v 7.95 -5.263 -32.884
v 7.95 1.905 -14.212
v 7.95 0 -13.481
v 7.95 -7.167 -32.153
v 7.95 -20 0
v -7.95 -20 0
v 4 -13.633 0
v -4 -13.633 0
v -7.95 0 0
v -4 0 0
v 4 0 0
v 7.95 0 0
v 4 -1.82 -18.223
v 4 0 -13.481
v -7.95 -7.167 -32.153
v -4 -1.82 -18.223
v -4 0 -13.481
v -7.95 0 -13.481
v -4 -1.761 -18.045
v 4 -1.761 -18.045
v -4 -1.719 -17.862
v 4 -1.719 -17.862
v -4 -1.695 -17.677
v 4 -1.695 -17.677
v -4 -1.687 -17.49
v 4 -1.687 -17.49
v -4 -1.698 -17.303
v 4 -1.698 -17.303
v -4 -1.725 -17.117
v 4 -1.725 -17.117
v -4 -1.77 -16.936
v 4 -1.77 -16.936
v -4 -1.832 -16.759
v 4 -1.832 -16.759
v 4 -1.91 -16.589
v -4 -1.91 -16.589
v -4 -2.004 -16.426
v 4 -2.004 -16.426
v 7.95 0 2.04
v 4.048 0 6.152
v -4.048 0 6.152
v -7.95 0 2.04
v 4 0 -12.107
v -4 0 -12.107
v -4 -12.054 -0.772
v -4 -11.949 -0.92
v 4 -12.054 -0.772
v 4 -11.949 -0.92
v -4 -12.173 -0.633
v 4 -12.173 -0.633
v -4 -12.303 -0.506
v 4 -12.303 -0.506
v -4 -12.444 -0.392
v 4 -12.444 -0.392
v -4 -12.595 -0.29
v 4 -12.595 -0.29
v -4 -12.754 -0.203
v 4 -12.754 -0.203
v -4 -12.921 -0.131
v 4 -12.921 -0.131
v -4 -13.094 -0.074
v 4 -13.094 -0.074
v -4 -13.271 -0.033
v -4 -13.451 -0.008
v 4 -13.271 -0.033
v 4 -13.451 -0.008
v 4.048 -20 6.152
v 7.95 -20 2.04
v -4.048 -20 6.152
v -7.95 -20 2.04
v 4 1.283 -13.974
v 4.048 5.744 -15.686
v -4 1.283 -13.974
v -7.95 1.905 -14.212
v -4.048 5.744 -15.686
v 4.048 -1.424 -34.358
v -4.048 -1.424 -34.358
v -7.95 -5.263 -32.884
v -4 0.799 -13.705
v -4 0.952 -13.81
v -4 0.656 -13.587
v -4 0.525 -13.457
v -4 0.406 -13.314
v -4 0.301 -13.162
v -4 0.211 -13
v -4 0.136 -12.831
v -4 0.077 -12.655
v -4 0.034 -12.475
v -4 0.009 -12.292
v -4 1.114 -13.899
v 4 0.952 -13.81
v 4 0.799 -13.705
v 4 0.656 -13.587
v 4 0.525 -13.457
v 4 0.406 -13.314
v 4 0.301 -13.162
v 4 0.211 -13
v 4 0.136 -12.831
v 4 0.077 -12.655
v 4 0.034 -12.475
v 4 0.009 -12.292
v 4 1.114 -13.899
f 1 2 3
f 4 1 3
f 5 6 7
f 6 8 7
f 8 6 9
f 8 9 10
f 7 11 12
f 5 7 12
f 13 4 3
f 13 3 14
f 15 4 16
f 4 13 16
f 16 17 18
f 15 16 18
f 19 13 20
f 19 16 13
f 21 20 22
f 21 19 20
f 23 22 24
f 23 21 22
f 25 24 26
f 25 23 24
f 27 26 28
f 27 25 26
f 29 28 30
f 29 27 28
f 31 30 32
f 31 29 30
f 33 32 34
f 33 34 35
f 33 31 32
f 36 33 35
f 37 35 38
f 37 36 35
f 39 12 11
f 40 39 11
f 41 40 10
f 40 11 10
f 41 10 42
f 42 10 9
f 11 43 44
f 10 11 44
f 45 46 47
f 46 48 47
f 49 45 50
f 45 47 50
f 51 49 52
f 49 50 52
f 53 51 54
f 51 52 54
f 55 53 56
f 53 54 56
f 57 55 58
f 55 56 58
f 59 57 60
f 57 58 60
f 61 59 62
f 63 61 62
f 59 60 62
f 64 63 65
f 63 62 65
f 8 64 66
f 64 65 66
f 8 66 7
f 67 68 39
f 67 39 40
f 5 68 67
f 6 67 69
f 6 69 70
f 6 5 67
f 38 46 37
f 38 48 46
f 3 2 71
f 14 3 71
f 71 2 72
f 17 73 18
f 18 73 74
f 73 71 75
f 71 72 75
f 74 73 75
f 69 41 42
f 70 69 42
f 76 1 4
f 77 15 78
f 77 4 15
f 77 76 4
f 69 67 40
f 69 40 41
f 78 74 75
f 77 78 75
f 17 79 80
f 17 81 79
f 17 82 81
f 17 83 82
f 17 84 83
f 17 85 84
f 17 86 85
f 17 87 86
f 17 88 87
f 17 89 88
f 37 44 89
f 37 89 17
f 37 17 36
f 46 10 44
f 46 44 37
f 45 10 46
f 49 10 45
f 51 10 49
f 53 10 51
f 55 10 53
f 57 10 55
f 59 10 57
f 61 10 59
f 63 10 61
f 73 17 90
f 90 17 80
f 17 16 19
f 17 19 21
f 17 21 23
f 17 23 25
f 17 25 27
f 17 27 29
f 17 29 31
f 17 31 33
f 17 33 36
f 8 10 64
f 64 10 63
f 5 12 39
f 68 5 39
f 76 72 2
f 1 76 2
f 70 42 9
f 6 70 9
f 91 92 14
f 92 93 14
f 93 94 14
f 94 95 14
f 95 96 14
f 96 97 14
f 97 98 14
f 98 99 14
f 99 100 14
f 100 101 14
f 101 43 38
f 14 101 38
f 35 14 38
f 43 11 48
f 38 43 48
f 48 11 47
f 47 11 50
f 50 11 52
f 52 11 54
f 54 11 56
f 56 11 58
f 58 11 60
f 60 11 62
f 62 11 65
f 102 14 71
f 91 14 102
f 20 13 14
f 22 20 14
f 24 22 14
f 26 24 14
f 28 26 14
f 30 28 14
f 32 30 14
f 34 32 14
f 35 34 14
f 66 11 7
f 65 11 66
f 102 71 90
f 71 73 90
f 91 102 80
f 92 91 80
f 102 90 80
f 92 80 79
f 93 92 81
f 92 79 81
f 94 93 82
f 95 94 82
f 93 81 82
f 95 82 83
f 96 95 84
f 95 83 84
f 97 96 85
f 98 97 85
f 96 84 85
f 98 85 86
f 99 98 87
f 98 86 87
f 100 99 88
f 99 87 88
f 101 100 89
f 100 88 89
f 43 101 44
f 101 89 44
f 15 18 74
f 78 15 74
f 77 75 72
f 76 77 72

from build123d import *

# Parameters (mm, degrees)
BOSS_EXTRUDE1_DEPTH = 20
BOSS_EXTRUDE3_DEPTH = 4
SKETCH11_W          = 8
SKETCH11_H          = 4.067153682
BOSS_EXTRUDE8_DEPTH = 1
BOSS_EXTRUDE7_DEPTH = 20
FILLET1_R           = 2


with BuildPart() as part:
    # Sketch1 → Boss-Extrude1 (new body)
    with BuildSketch(Plane(origin=(0, 0, 0), x_dir=(1, 0, 0), z_dir=(0, 1, 0))):
        Polygon((7.95, 0), (7.95, -2.04), (4.048, -6.152414984), (-4.048, -6.152414984), (-7.95, -2.04), (-7.95, 0), align=None)
    extrude(amount=-BOSS_EXTRUDE1_DEPTH)

    # Sketch4 → Boss-Extrude3 (add, symmetric)
    with BuildSketch(Plane(origin=(0, 0, 0), x_dir=(0, 0, -1), z_dir=(1, 0, 0))):
        Polygon((13.481068451, 0), (0, 0), (0, -12.539693486), (17.27808352, -1.457537526), align=None)
    extrude(amount=BOSS_EXTRUDE3_DEPTH, both=True)

    # Sketch11 → Boss-Extrude8 (add)
    with BuildSketch(Plane(origin=(0, 4.510297753, -1.731341095), x_dir=(1, 0, 0), z_dir=(0, 0.933580426, -0.35836795))):
        with Locations((0, 14.619238475)):
            Rectangle(SKETCH11_W, SKETCH11_H)
    extrude(amount=BOSS_EXTRUDE8_DEPTH)

    # Sketch10 → Boss-Extrude7 (add)
    with BuildSketch(Plane(origin=(0, -4.510297753, -11.749727356), x_dir=(1, 0, 0), z_dir=(0, 0.35836795, 0.933580426))):
        Polygon((-7.95, 4.831182858), (-7.95, 6.871182858), (-4.048, 10.983597842), (4.048, 10.983597842), (7.95, 6.871182858), (7.95, 4.831182858), align=None)
    extrude(amount=-BOSS_EXTRUDE7_DEPTH)

    # Fillet1
    fillet1_edges = [part.edges().sort_by_distance(p)[0] for p in [
        (0, -12.539693486, 0),
        (0, -1.457537526, -17.27808352),
        (0, 0, -13.481068451),
    ]]
    fillet(fillet1_edges, radius=FILLET1_R)


solid = part.part
